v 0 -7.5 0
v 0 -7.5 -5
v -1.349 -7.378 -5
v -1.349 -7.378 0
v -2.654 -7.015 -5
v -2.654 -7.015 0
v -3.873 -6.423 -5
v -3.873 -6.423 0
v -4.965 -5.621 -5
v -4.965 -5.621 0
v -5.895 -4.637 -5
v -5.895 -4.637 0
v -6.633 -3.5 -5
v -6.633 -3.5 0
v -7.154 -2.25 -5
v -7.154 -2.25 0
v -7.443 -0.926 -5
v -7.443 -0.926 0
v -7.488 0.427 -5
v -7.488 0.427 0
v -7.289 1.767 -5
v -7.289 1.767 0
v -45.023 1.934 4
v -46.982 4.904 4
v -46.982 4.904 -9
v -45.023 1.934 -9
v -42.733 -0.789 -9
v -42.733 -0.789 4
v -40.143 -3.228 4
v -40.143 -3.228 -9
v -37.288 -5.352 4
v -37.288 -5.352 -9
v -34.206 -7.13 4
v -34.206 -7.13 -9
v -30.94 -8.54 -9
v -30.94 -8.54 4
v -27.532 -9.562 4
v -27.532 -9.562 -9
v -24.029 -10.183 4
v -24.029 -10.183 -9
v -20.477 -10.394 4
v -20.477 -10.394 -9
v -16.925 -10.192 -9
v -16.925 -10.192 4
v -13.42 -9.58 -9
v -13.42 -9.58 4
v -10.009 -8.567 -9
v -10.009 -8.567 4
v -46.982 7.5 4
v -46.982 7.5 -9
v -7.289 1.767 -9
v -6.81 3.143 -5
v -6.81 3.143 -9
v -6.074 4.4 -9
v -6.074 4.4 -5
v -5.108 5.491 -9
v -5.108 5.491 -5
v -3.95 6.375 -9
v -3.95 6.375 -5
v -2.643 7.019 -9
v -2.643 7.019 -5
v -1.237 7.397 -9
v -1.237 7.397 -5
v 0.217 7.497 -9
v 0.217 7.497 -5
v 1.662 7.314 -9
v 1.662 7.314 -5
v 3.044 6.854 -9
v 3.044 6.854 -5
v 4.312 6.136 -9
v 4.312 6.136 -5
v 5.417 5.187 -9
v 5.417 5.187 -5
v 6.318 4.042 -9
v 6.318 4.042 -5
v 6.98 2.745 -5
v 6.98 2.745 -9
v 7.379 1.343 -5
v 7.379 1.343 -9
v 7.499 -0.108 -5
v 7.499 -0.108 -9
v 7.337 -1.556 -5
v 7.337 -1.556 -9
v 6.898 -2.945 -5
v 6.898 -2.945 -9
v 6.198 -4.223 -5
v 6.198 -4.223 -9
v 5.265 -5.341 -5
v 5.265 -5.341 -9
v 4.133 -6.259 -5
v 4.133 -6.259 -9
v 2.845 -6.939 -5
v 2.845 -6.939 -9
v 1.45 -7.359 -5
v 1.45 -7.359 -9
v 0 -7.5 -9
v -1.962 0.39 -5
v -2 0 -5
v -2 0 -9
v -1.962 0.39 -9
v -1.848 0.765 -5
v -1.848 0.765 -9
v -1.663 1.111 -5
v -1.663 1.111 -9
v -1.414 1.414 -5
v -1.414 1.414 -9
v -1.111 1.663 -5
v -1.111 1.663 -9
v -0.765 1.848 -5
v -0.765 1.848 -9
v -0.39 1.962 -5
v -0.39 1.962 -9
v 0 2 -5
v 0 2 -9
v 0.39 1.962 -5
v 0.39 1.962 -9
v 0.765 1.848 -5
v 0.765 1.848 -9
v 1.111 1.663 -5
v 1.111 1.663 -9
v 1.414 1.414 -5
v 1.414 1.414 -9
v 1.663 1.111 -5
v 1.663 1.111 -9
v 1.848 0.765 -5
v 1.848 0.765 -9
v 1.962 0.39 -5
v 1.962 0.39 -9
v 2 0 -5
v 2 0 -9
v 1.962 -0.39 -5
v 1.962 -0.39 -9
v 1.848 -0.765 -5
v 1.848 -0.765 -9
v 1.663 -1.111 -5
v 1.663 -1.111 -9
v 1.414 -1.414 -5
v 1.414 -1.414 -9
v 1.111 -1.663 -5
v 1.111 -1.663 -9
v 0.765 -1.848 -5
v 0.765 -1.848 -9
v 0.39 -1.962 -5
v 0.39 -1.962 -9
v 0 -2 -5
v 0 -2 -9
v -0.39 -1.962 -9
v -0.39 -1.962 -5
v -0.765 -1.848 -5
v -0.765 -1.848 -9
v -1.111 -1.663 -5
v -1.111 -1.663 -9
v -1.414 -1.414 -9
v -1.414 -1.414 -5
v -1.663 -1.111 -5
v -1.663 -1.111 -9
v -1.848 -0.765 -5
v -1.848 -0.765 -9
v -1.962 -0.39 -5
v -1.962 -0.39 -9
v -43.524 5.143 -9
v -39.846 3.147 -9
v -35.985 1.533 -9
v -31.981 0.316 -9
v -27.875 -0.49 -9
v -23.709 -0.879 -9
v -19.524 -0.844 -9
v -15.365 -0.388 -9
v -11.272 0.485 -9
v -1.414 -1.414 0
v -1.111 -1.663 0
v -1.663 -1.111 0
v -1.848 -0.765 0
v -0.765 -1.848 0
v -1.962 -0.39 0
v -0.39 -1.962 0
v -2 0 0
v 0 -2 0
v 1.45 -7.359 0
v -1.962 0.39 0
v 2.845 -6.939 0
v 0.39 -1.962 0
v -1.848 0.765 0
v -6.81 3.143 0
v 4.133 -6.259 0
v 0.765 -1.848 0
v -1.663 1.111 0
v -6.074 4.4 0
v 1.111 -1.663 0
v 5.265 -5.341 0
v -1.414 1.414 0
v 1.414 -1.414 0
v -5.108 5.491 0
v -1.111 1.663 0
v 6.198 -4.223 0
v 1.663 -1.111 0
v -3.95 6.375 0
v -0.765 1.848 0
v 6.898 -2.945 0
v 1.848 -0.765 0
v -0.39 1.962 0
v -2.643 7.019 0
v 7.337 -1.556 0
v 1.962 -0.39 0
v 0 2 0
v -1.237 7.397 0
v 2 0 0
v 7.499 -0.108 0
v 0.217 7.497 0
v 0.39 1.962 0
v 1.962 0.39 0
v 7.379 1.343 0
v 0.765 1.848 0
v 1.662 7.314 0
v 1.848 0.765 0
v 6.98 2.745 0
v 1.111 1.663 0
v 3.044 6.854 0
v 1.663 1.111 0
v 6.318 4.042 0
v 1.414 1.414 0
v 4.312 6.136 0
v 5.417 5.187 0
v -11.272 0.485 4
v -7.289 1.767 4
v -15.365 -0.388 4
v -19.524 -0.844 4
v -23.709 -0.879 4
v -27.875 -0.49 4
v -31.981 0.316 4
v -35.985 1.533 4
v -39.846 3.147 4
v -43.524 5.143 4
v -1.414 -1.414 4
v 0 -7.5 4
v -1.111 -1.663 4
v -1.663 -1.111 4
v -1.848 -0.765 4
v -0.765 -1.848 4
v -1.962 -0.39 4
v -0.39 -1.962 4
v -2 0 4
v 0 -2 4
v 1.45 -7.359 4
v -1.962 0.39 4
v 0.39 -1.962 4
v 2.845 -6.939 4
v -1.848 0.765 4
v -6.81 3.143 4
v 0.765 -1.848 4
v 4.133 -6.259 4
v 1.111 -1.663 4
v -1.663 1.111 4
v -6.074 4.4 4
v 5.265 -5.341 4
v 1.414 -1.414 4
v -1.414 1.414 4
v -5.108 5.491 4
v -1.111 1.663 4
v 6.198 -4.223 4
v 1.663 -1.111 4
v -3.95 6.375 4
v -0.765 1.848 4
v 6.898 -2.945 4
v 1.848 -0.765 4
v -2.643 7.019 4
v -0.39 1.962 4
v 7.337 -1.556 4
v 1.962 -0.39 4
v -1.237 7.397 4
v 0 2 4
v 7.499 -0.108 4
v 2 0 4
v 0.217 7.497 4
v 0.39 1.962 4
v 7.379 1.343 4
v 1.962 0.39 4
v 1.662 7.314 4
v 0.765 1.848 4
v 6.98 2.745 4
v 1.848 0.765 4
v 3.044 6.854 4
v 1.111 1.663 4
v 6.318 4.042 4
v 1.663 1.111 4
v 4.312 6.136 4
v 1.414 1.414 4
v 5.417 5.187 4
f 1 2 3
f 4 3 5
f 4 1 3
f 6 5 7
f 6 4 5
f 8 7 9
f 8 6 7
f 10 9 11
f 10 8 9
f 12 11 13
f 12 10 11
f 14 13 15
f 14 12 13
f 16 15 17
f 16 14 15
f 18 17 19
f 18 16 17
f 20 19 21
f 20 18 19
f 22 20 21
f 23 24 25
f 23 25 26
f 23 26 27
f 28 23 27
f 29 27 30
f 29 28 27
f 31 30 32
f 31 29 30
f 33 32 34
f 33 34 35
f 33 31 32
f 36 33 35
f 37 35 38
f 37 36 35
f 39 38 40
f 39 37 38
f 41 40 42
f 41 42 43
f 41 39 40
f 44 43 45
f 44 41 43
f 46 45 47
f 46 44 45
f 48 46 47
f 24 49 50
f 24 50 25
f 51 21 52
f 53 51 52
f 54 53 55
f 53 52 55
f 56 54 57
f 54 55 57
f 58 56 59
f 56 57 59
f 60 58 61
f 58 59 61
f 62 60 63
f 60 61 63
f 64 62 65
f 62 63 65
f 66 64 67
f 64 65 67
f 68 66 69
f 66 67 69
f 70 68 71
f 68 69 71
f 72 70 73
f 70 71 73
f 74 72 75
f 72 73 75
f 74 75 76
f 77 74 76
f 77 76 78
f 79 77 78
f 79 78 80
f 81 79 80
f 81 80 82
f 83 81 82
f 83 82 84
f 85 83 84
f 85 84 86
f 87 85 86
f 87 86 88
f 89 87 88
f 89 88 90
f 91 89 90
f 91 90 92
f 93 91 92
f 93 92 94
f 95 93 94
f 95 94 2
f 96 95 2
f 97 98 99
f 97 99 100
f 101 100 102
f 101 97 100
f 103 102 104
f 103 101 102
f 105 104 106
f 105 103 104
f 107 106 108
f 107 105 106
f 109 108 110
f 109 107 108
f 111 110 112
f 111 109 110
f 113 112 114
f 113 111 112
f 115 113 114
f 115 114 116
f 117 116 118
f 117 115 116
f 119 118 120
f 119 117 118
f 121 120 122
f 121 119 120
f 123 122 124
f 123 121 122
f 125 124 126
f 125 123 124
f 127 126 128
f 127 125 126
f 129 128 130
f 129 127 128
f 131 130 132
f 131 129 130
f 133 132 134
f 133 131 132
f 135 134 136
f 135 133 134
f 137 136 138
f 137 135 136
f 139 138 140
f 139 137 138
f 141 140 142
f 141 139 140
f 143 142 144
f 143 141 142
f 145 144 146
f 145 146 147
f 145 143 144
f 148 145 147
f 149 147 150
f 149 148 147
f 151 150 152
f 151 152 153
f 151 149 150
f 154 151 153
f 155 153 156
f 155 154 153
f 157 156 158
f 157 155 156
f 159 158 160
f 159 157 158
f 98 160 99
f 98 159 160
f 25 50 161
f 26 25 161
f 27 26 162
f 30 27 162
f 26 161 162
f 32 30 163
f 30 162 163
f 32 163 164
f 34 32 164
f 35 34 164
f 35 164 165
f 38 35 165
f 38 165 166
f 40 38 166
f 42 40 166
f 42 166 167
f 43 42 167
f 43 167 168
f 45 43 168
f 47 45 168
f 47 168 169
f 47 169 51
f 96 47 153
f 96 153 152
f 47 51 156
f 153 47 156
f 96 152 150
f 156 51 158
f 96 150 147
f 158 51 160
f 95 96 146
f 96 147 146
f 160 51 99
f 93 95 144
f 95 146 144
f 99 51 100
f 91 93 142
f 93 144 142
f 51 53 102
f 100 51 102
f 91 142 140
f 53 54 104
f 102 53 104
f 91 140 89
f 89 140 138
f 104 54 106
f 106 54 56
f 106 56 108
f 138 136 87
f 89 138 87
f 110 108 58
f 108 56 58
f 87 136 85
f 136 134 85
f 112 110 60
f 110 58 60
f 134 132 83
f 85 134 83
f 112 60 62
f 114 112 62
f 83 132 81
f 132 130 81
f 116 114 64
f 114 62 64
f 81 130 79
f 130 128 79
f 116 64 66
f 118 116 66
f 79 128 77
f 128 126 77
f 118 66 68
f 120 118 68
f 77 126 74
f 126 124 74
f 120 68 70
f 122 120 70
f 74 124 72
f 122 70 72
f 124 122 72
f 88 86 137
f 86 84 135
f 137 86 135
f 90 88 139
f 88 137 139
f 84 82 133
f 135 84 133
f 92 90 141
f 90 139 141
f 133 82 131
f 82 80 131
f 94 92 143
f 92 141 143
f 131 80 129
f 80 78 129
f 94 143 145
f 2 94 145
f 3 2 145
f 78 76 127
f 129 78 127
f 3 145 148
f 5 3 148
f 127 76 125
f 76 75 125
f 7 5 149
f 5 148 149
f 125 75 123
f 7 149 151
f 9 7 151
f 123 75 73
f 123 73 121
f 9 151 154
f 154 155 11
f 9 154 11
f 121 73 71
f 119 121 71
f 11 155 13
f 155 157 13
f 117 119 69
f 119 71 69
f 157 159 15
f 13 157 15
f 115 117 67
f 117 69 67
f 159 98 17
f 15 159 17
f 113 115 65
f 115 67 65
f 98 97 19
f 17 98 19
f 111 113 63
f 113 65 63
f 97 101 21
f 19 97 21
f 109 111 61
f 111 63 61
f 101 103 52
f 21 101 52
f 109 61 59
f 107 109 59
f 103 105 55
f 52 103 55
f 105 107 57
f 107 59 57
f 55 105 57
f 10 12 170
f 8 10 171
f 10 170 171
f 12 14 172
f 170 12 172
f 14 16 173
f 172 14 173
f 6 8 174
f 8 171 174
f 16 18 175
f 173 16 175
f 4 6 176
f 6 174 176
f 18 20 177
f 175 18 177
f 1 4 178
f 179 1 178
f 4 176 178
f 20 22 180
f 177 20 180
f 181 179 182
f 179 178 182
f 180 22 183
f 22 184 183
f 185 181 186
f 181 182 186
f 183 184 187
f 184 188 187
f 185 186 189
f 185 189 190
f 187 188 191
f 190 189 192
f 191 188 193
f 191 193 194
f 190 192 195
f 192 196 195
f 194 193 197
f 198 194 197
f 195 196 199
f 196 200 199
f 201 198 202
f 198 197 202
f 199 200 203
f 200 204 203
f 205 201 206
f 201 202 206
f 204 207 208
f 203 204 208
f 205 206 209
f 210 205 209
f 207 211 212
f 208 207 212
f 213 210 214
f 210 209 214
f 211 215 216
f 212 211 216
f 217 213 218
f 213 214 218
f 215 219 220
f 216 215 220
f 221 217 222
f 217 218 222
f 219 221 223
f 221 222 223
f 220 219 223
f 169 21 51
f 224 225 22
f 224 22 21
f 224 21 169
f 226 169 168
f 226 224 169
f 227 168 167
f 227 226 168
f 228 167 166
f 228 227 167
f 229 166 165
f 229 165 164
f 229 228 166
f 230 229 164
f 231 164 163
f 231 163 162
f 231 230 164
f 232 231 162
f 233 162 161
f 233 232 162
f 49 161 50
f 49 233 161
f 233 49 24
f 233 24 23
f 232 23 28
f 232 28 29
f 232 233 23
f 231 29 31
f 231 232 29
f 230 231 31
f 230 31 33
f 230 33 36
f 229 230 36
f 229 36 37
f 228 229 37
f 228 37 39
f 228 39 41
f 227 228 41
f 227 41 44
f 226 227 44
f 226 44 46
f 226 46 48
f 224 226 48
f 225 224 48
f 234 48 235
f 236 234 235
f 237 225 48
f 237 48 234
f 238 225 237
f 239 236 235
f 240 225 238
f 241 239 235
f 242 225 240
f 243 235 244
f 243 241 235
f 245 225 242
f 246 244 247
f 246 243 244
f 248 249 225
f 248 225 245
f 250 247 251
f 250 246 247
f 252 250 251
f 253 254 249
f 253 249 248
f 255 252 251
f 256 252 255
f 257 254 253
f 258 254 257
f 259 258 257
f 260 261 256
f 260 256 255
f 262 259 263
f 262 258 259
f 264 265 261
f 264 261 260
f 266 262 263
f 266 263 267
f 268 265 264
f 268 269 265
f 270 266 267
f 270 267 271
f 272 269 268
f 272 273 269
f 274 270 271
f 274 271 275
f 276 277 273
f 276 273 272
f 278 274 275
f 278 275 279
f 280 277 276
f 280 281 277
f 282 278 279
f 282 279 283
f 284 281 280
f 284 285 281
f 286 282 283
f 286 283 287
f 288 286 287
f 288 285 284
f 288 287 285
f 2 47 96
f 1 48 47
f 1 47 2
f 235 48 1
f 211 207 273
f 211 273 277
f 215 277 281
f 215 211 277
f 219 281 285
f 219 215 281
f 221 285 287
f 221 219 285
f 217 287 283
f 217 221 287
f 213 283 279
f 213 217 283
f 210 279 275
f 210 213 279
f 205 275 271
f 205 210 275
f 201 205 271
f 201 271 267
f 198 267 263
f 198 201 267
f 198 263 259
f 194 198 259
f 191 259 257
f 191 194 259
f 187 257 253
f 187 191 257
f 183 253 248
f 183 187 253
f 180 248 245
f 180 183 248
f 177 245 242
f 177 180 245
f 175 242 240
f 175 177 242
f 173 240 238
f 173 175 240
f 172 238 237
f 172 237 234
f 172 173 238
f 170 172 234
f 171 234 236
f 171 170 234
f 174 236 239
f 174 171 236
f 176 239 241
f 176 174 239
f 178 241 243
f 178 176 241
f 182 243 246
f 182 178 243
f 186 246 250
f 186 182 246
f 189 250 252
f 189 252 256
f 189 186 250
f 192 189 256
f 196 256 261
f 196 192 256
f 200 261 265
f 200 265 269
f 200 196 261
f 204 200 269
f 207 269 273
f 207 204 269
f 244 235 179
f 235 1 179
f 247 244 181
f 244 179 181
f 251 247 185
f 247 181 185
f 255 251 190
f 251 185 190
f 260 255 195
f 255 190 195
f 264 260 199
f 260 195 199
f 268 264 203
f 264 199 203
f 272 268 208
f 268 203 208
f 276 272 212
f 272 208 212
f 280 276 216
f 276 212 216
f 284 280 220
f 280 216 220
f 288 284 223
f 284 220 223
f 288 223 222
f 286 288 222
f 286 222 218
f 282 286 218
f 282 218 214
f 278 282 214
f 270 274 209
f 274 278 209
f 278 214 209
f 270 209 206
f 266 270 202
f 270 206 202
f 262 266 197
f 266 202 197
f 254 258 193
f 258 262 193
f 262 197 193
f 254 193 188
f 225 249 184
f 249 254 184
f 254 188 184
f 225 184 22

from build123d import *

# Parameters (mm, degrees)
CROQUIS1_R              = 7.5
CROQUIS1_R_2            = 2
SALIENTE_EXTRUIR1_DEPTH = 4
CROQUIS2_R              = 2.193779366
SALIENTE_EXTRUIR2_DEPTH = 5
CROQUIS3_R              = 7.5
CROQUIS3_R_2            = 2
SALIENTE_EXTRUIR3_DEPTH = 4
CROQUIS4_R              = 2.193779366
CORTAR_EXTRUIR1_DEPTH   = 14
SALIENTE_EXTRUIR4_DEPTH = 13


with BuildPart() as part:
    # Croquis1 → Saliente-Extruir1 (new body)
    with BuildSketch(Plane.XY):
        Circle(CROQUIS1_R)
        Circle(CROQUIS1_R_2, mode=Mode.SUBTRACT)
    extrude(amount=SALIENTE_EXTRUIR1_DEPTH)



with BuildPart() as body_2:
    # Croquis2 → Saliente-Extruir2 (new body)
    with BuildSketch(Plane(origin=(0, 0, 0), x_dir=(-1, 0, 0), z_dir=(0, 0, -1))):
        Circle(CROQUIS2_R)
    extrude(amount=SALIENTE_EXTRUIR2_DEPTH)

    # Croquis4 → Cortar-Extruir1 (cut)
    with BuildSketch(Plane(origin=(0, 0, -5), x_dir=(-1, 0, 0), z_dir=(0, 0, -1))):
        Circle(CROQUIS4_R)
    extrude(amount=-CORTAR_EXTRUIR1_DEPTH, mode=Mode.SUBTRACT)


with BuildPart() as body_3:
    # Croquis3 → Saliente-Extruir3 (new body)
    with BuildSketch(Plane(origin=(0, 0, -5), x_dir=(-1, 0, 0), z_dir=(0, 0, -1))):
        Circle(CROQUIS3_R)
        Circle(CROQUIS3_R_2, mode=Mode.SUBTRACT)
    extrude(amount=SALIENTE_EXTRUIR3_DEPTH)


with BuildPart() as part_1:
    add(part.part)

    add(body_3.part)  # Saliente-Extruir4 merges body 3
    # Croquis5 → Saliente-Extruir4 (add)
    with BuildSketch(Plane.XY.offset(4)):
        with BuildLine():
            Line((-10.009282788, -8.566914266), (0, -7.5))
            ThreePointArc((0, -7.5), (-5.895156044, -4.636500319), (-7.288771435, 1.76743061))
            ThreePointArc((-7.288771435, 1.76743061), (-27.875344012, -0.49038836), (-46.981845806, 7.5))
            Line((-46.981845806, 7.5), (-46.981845806, 4.90393409))
            ThreePointArc((-46.981845806, 4.90393409), (-30.939741801, -8.539865418), (-10.009282788, -8.566914266))
        make_face()
    extrude(amount=-SALIENTE_EXTRUIR4_DEPTH)


solid = part_1.part
